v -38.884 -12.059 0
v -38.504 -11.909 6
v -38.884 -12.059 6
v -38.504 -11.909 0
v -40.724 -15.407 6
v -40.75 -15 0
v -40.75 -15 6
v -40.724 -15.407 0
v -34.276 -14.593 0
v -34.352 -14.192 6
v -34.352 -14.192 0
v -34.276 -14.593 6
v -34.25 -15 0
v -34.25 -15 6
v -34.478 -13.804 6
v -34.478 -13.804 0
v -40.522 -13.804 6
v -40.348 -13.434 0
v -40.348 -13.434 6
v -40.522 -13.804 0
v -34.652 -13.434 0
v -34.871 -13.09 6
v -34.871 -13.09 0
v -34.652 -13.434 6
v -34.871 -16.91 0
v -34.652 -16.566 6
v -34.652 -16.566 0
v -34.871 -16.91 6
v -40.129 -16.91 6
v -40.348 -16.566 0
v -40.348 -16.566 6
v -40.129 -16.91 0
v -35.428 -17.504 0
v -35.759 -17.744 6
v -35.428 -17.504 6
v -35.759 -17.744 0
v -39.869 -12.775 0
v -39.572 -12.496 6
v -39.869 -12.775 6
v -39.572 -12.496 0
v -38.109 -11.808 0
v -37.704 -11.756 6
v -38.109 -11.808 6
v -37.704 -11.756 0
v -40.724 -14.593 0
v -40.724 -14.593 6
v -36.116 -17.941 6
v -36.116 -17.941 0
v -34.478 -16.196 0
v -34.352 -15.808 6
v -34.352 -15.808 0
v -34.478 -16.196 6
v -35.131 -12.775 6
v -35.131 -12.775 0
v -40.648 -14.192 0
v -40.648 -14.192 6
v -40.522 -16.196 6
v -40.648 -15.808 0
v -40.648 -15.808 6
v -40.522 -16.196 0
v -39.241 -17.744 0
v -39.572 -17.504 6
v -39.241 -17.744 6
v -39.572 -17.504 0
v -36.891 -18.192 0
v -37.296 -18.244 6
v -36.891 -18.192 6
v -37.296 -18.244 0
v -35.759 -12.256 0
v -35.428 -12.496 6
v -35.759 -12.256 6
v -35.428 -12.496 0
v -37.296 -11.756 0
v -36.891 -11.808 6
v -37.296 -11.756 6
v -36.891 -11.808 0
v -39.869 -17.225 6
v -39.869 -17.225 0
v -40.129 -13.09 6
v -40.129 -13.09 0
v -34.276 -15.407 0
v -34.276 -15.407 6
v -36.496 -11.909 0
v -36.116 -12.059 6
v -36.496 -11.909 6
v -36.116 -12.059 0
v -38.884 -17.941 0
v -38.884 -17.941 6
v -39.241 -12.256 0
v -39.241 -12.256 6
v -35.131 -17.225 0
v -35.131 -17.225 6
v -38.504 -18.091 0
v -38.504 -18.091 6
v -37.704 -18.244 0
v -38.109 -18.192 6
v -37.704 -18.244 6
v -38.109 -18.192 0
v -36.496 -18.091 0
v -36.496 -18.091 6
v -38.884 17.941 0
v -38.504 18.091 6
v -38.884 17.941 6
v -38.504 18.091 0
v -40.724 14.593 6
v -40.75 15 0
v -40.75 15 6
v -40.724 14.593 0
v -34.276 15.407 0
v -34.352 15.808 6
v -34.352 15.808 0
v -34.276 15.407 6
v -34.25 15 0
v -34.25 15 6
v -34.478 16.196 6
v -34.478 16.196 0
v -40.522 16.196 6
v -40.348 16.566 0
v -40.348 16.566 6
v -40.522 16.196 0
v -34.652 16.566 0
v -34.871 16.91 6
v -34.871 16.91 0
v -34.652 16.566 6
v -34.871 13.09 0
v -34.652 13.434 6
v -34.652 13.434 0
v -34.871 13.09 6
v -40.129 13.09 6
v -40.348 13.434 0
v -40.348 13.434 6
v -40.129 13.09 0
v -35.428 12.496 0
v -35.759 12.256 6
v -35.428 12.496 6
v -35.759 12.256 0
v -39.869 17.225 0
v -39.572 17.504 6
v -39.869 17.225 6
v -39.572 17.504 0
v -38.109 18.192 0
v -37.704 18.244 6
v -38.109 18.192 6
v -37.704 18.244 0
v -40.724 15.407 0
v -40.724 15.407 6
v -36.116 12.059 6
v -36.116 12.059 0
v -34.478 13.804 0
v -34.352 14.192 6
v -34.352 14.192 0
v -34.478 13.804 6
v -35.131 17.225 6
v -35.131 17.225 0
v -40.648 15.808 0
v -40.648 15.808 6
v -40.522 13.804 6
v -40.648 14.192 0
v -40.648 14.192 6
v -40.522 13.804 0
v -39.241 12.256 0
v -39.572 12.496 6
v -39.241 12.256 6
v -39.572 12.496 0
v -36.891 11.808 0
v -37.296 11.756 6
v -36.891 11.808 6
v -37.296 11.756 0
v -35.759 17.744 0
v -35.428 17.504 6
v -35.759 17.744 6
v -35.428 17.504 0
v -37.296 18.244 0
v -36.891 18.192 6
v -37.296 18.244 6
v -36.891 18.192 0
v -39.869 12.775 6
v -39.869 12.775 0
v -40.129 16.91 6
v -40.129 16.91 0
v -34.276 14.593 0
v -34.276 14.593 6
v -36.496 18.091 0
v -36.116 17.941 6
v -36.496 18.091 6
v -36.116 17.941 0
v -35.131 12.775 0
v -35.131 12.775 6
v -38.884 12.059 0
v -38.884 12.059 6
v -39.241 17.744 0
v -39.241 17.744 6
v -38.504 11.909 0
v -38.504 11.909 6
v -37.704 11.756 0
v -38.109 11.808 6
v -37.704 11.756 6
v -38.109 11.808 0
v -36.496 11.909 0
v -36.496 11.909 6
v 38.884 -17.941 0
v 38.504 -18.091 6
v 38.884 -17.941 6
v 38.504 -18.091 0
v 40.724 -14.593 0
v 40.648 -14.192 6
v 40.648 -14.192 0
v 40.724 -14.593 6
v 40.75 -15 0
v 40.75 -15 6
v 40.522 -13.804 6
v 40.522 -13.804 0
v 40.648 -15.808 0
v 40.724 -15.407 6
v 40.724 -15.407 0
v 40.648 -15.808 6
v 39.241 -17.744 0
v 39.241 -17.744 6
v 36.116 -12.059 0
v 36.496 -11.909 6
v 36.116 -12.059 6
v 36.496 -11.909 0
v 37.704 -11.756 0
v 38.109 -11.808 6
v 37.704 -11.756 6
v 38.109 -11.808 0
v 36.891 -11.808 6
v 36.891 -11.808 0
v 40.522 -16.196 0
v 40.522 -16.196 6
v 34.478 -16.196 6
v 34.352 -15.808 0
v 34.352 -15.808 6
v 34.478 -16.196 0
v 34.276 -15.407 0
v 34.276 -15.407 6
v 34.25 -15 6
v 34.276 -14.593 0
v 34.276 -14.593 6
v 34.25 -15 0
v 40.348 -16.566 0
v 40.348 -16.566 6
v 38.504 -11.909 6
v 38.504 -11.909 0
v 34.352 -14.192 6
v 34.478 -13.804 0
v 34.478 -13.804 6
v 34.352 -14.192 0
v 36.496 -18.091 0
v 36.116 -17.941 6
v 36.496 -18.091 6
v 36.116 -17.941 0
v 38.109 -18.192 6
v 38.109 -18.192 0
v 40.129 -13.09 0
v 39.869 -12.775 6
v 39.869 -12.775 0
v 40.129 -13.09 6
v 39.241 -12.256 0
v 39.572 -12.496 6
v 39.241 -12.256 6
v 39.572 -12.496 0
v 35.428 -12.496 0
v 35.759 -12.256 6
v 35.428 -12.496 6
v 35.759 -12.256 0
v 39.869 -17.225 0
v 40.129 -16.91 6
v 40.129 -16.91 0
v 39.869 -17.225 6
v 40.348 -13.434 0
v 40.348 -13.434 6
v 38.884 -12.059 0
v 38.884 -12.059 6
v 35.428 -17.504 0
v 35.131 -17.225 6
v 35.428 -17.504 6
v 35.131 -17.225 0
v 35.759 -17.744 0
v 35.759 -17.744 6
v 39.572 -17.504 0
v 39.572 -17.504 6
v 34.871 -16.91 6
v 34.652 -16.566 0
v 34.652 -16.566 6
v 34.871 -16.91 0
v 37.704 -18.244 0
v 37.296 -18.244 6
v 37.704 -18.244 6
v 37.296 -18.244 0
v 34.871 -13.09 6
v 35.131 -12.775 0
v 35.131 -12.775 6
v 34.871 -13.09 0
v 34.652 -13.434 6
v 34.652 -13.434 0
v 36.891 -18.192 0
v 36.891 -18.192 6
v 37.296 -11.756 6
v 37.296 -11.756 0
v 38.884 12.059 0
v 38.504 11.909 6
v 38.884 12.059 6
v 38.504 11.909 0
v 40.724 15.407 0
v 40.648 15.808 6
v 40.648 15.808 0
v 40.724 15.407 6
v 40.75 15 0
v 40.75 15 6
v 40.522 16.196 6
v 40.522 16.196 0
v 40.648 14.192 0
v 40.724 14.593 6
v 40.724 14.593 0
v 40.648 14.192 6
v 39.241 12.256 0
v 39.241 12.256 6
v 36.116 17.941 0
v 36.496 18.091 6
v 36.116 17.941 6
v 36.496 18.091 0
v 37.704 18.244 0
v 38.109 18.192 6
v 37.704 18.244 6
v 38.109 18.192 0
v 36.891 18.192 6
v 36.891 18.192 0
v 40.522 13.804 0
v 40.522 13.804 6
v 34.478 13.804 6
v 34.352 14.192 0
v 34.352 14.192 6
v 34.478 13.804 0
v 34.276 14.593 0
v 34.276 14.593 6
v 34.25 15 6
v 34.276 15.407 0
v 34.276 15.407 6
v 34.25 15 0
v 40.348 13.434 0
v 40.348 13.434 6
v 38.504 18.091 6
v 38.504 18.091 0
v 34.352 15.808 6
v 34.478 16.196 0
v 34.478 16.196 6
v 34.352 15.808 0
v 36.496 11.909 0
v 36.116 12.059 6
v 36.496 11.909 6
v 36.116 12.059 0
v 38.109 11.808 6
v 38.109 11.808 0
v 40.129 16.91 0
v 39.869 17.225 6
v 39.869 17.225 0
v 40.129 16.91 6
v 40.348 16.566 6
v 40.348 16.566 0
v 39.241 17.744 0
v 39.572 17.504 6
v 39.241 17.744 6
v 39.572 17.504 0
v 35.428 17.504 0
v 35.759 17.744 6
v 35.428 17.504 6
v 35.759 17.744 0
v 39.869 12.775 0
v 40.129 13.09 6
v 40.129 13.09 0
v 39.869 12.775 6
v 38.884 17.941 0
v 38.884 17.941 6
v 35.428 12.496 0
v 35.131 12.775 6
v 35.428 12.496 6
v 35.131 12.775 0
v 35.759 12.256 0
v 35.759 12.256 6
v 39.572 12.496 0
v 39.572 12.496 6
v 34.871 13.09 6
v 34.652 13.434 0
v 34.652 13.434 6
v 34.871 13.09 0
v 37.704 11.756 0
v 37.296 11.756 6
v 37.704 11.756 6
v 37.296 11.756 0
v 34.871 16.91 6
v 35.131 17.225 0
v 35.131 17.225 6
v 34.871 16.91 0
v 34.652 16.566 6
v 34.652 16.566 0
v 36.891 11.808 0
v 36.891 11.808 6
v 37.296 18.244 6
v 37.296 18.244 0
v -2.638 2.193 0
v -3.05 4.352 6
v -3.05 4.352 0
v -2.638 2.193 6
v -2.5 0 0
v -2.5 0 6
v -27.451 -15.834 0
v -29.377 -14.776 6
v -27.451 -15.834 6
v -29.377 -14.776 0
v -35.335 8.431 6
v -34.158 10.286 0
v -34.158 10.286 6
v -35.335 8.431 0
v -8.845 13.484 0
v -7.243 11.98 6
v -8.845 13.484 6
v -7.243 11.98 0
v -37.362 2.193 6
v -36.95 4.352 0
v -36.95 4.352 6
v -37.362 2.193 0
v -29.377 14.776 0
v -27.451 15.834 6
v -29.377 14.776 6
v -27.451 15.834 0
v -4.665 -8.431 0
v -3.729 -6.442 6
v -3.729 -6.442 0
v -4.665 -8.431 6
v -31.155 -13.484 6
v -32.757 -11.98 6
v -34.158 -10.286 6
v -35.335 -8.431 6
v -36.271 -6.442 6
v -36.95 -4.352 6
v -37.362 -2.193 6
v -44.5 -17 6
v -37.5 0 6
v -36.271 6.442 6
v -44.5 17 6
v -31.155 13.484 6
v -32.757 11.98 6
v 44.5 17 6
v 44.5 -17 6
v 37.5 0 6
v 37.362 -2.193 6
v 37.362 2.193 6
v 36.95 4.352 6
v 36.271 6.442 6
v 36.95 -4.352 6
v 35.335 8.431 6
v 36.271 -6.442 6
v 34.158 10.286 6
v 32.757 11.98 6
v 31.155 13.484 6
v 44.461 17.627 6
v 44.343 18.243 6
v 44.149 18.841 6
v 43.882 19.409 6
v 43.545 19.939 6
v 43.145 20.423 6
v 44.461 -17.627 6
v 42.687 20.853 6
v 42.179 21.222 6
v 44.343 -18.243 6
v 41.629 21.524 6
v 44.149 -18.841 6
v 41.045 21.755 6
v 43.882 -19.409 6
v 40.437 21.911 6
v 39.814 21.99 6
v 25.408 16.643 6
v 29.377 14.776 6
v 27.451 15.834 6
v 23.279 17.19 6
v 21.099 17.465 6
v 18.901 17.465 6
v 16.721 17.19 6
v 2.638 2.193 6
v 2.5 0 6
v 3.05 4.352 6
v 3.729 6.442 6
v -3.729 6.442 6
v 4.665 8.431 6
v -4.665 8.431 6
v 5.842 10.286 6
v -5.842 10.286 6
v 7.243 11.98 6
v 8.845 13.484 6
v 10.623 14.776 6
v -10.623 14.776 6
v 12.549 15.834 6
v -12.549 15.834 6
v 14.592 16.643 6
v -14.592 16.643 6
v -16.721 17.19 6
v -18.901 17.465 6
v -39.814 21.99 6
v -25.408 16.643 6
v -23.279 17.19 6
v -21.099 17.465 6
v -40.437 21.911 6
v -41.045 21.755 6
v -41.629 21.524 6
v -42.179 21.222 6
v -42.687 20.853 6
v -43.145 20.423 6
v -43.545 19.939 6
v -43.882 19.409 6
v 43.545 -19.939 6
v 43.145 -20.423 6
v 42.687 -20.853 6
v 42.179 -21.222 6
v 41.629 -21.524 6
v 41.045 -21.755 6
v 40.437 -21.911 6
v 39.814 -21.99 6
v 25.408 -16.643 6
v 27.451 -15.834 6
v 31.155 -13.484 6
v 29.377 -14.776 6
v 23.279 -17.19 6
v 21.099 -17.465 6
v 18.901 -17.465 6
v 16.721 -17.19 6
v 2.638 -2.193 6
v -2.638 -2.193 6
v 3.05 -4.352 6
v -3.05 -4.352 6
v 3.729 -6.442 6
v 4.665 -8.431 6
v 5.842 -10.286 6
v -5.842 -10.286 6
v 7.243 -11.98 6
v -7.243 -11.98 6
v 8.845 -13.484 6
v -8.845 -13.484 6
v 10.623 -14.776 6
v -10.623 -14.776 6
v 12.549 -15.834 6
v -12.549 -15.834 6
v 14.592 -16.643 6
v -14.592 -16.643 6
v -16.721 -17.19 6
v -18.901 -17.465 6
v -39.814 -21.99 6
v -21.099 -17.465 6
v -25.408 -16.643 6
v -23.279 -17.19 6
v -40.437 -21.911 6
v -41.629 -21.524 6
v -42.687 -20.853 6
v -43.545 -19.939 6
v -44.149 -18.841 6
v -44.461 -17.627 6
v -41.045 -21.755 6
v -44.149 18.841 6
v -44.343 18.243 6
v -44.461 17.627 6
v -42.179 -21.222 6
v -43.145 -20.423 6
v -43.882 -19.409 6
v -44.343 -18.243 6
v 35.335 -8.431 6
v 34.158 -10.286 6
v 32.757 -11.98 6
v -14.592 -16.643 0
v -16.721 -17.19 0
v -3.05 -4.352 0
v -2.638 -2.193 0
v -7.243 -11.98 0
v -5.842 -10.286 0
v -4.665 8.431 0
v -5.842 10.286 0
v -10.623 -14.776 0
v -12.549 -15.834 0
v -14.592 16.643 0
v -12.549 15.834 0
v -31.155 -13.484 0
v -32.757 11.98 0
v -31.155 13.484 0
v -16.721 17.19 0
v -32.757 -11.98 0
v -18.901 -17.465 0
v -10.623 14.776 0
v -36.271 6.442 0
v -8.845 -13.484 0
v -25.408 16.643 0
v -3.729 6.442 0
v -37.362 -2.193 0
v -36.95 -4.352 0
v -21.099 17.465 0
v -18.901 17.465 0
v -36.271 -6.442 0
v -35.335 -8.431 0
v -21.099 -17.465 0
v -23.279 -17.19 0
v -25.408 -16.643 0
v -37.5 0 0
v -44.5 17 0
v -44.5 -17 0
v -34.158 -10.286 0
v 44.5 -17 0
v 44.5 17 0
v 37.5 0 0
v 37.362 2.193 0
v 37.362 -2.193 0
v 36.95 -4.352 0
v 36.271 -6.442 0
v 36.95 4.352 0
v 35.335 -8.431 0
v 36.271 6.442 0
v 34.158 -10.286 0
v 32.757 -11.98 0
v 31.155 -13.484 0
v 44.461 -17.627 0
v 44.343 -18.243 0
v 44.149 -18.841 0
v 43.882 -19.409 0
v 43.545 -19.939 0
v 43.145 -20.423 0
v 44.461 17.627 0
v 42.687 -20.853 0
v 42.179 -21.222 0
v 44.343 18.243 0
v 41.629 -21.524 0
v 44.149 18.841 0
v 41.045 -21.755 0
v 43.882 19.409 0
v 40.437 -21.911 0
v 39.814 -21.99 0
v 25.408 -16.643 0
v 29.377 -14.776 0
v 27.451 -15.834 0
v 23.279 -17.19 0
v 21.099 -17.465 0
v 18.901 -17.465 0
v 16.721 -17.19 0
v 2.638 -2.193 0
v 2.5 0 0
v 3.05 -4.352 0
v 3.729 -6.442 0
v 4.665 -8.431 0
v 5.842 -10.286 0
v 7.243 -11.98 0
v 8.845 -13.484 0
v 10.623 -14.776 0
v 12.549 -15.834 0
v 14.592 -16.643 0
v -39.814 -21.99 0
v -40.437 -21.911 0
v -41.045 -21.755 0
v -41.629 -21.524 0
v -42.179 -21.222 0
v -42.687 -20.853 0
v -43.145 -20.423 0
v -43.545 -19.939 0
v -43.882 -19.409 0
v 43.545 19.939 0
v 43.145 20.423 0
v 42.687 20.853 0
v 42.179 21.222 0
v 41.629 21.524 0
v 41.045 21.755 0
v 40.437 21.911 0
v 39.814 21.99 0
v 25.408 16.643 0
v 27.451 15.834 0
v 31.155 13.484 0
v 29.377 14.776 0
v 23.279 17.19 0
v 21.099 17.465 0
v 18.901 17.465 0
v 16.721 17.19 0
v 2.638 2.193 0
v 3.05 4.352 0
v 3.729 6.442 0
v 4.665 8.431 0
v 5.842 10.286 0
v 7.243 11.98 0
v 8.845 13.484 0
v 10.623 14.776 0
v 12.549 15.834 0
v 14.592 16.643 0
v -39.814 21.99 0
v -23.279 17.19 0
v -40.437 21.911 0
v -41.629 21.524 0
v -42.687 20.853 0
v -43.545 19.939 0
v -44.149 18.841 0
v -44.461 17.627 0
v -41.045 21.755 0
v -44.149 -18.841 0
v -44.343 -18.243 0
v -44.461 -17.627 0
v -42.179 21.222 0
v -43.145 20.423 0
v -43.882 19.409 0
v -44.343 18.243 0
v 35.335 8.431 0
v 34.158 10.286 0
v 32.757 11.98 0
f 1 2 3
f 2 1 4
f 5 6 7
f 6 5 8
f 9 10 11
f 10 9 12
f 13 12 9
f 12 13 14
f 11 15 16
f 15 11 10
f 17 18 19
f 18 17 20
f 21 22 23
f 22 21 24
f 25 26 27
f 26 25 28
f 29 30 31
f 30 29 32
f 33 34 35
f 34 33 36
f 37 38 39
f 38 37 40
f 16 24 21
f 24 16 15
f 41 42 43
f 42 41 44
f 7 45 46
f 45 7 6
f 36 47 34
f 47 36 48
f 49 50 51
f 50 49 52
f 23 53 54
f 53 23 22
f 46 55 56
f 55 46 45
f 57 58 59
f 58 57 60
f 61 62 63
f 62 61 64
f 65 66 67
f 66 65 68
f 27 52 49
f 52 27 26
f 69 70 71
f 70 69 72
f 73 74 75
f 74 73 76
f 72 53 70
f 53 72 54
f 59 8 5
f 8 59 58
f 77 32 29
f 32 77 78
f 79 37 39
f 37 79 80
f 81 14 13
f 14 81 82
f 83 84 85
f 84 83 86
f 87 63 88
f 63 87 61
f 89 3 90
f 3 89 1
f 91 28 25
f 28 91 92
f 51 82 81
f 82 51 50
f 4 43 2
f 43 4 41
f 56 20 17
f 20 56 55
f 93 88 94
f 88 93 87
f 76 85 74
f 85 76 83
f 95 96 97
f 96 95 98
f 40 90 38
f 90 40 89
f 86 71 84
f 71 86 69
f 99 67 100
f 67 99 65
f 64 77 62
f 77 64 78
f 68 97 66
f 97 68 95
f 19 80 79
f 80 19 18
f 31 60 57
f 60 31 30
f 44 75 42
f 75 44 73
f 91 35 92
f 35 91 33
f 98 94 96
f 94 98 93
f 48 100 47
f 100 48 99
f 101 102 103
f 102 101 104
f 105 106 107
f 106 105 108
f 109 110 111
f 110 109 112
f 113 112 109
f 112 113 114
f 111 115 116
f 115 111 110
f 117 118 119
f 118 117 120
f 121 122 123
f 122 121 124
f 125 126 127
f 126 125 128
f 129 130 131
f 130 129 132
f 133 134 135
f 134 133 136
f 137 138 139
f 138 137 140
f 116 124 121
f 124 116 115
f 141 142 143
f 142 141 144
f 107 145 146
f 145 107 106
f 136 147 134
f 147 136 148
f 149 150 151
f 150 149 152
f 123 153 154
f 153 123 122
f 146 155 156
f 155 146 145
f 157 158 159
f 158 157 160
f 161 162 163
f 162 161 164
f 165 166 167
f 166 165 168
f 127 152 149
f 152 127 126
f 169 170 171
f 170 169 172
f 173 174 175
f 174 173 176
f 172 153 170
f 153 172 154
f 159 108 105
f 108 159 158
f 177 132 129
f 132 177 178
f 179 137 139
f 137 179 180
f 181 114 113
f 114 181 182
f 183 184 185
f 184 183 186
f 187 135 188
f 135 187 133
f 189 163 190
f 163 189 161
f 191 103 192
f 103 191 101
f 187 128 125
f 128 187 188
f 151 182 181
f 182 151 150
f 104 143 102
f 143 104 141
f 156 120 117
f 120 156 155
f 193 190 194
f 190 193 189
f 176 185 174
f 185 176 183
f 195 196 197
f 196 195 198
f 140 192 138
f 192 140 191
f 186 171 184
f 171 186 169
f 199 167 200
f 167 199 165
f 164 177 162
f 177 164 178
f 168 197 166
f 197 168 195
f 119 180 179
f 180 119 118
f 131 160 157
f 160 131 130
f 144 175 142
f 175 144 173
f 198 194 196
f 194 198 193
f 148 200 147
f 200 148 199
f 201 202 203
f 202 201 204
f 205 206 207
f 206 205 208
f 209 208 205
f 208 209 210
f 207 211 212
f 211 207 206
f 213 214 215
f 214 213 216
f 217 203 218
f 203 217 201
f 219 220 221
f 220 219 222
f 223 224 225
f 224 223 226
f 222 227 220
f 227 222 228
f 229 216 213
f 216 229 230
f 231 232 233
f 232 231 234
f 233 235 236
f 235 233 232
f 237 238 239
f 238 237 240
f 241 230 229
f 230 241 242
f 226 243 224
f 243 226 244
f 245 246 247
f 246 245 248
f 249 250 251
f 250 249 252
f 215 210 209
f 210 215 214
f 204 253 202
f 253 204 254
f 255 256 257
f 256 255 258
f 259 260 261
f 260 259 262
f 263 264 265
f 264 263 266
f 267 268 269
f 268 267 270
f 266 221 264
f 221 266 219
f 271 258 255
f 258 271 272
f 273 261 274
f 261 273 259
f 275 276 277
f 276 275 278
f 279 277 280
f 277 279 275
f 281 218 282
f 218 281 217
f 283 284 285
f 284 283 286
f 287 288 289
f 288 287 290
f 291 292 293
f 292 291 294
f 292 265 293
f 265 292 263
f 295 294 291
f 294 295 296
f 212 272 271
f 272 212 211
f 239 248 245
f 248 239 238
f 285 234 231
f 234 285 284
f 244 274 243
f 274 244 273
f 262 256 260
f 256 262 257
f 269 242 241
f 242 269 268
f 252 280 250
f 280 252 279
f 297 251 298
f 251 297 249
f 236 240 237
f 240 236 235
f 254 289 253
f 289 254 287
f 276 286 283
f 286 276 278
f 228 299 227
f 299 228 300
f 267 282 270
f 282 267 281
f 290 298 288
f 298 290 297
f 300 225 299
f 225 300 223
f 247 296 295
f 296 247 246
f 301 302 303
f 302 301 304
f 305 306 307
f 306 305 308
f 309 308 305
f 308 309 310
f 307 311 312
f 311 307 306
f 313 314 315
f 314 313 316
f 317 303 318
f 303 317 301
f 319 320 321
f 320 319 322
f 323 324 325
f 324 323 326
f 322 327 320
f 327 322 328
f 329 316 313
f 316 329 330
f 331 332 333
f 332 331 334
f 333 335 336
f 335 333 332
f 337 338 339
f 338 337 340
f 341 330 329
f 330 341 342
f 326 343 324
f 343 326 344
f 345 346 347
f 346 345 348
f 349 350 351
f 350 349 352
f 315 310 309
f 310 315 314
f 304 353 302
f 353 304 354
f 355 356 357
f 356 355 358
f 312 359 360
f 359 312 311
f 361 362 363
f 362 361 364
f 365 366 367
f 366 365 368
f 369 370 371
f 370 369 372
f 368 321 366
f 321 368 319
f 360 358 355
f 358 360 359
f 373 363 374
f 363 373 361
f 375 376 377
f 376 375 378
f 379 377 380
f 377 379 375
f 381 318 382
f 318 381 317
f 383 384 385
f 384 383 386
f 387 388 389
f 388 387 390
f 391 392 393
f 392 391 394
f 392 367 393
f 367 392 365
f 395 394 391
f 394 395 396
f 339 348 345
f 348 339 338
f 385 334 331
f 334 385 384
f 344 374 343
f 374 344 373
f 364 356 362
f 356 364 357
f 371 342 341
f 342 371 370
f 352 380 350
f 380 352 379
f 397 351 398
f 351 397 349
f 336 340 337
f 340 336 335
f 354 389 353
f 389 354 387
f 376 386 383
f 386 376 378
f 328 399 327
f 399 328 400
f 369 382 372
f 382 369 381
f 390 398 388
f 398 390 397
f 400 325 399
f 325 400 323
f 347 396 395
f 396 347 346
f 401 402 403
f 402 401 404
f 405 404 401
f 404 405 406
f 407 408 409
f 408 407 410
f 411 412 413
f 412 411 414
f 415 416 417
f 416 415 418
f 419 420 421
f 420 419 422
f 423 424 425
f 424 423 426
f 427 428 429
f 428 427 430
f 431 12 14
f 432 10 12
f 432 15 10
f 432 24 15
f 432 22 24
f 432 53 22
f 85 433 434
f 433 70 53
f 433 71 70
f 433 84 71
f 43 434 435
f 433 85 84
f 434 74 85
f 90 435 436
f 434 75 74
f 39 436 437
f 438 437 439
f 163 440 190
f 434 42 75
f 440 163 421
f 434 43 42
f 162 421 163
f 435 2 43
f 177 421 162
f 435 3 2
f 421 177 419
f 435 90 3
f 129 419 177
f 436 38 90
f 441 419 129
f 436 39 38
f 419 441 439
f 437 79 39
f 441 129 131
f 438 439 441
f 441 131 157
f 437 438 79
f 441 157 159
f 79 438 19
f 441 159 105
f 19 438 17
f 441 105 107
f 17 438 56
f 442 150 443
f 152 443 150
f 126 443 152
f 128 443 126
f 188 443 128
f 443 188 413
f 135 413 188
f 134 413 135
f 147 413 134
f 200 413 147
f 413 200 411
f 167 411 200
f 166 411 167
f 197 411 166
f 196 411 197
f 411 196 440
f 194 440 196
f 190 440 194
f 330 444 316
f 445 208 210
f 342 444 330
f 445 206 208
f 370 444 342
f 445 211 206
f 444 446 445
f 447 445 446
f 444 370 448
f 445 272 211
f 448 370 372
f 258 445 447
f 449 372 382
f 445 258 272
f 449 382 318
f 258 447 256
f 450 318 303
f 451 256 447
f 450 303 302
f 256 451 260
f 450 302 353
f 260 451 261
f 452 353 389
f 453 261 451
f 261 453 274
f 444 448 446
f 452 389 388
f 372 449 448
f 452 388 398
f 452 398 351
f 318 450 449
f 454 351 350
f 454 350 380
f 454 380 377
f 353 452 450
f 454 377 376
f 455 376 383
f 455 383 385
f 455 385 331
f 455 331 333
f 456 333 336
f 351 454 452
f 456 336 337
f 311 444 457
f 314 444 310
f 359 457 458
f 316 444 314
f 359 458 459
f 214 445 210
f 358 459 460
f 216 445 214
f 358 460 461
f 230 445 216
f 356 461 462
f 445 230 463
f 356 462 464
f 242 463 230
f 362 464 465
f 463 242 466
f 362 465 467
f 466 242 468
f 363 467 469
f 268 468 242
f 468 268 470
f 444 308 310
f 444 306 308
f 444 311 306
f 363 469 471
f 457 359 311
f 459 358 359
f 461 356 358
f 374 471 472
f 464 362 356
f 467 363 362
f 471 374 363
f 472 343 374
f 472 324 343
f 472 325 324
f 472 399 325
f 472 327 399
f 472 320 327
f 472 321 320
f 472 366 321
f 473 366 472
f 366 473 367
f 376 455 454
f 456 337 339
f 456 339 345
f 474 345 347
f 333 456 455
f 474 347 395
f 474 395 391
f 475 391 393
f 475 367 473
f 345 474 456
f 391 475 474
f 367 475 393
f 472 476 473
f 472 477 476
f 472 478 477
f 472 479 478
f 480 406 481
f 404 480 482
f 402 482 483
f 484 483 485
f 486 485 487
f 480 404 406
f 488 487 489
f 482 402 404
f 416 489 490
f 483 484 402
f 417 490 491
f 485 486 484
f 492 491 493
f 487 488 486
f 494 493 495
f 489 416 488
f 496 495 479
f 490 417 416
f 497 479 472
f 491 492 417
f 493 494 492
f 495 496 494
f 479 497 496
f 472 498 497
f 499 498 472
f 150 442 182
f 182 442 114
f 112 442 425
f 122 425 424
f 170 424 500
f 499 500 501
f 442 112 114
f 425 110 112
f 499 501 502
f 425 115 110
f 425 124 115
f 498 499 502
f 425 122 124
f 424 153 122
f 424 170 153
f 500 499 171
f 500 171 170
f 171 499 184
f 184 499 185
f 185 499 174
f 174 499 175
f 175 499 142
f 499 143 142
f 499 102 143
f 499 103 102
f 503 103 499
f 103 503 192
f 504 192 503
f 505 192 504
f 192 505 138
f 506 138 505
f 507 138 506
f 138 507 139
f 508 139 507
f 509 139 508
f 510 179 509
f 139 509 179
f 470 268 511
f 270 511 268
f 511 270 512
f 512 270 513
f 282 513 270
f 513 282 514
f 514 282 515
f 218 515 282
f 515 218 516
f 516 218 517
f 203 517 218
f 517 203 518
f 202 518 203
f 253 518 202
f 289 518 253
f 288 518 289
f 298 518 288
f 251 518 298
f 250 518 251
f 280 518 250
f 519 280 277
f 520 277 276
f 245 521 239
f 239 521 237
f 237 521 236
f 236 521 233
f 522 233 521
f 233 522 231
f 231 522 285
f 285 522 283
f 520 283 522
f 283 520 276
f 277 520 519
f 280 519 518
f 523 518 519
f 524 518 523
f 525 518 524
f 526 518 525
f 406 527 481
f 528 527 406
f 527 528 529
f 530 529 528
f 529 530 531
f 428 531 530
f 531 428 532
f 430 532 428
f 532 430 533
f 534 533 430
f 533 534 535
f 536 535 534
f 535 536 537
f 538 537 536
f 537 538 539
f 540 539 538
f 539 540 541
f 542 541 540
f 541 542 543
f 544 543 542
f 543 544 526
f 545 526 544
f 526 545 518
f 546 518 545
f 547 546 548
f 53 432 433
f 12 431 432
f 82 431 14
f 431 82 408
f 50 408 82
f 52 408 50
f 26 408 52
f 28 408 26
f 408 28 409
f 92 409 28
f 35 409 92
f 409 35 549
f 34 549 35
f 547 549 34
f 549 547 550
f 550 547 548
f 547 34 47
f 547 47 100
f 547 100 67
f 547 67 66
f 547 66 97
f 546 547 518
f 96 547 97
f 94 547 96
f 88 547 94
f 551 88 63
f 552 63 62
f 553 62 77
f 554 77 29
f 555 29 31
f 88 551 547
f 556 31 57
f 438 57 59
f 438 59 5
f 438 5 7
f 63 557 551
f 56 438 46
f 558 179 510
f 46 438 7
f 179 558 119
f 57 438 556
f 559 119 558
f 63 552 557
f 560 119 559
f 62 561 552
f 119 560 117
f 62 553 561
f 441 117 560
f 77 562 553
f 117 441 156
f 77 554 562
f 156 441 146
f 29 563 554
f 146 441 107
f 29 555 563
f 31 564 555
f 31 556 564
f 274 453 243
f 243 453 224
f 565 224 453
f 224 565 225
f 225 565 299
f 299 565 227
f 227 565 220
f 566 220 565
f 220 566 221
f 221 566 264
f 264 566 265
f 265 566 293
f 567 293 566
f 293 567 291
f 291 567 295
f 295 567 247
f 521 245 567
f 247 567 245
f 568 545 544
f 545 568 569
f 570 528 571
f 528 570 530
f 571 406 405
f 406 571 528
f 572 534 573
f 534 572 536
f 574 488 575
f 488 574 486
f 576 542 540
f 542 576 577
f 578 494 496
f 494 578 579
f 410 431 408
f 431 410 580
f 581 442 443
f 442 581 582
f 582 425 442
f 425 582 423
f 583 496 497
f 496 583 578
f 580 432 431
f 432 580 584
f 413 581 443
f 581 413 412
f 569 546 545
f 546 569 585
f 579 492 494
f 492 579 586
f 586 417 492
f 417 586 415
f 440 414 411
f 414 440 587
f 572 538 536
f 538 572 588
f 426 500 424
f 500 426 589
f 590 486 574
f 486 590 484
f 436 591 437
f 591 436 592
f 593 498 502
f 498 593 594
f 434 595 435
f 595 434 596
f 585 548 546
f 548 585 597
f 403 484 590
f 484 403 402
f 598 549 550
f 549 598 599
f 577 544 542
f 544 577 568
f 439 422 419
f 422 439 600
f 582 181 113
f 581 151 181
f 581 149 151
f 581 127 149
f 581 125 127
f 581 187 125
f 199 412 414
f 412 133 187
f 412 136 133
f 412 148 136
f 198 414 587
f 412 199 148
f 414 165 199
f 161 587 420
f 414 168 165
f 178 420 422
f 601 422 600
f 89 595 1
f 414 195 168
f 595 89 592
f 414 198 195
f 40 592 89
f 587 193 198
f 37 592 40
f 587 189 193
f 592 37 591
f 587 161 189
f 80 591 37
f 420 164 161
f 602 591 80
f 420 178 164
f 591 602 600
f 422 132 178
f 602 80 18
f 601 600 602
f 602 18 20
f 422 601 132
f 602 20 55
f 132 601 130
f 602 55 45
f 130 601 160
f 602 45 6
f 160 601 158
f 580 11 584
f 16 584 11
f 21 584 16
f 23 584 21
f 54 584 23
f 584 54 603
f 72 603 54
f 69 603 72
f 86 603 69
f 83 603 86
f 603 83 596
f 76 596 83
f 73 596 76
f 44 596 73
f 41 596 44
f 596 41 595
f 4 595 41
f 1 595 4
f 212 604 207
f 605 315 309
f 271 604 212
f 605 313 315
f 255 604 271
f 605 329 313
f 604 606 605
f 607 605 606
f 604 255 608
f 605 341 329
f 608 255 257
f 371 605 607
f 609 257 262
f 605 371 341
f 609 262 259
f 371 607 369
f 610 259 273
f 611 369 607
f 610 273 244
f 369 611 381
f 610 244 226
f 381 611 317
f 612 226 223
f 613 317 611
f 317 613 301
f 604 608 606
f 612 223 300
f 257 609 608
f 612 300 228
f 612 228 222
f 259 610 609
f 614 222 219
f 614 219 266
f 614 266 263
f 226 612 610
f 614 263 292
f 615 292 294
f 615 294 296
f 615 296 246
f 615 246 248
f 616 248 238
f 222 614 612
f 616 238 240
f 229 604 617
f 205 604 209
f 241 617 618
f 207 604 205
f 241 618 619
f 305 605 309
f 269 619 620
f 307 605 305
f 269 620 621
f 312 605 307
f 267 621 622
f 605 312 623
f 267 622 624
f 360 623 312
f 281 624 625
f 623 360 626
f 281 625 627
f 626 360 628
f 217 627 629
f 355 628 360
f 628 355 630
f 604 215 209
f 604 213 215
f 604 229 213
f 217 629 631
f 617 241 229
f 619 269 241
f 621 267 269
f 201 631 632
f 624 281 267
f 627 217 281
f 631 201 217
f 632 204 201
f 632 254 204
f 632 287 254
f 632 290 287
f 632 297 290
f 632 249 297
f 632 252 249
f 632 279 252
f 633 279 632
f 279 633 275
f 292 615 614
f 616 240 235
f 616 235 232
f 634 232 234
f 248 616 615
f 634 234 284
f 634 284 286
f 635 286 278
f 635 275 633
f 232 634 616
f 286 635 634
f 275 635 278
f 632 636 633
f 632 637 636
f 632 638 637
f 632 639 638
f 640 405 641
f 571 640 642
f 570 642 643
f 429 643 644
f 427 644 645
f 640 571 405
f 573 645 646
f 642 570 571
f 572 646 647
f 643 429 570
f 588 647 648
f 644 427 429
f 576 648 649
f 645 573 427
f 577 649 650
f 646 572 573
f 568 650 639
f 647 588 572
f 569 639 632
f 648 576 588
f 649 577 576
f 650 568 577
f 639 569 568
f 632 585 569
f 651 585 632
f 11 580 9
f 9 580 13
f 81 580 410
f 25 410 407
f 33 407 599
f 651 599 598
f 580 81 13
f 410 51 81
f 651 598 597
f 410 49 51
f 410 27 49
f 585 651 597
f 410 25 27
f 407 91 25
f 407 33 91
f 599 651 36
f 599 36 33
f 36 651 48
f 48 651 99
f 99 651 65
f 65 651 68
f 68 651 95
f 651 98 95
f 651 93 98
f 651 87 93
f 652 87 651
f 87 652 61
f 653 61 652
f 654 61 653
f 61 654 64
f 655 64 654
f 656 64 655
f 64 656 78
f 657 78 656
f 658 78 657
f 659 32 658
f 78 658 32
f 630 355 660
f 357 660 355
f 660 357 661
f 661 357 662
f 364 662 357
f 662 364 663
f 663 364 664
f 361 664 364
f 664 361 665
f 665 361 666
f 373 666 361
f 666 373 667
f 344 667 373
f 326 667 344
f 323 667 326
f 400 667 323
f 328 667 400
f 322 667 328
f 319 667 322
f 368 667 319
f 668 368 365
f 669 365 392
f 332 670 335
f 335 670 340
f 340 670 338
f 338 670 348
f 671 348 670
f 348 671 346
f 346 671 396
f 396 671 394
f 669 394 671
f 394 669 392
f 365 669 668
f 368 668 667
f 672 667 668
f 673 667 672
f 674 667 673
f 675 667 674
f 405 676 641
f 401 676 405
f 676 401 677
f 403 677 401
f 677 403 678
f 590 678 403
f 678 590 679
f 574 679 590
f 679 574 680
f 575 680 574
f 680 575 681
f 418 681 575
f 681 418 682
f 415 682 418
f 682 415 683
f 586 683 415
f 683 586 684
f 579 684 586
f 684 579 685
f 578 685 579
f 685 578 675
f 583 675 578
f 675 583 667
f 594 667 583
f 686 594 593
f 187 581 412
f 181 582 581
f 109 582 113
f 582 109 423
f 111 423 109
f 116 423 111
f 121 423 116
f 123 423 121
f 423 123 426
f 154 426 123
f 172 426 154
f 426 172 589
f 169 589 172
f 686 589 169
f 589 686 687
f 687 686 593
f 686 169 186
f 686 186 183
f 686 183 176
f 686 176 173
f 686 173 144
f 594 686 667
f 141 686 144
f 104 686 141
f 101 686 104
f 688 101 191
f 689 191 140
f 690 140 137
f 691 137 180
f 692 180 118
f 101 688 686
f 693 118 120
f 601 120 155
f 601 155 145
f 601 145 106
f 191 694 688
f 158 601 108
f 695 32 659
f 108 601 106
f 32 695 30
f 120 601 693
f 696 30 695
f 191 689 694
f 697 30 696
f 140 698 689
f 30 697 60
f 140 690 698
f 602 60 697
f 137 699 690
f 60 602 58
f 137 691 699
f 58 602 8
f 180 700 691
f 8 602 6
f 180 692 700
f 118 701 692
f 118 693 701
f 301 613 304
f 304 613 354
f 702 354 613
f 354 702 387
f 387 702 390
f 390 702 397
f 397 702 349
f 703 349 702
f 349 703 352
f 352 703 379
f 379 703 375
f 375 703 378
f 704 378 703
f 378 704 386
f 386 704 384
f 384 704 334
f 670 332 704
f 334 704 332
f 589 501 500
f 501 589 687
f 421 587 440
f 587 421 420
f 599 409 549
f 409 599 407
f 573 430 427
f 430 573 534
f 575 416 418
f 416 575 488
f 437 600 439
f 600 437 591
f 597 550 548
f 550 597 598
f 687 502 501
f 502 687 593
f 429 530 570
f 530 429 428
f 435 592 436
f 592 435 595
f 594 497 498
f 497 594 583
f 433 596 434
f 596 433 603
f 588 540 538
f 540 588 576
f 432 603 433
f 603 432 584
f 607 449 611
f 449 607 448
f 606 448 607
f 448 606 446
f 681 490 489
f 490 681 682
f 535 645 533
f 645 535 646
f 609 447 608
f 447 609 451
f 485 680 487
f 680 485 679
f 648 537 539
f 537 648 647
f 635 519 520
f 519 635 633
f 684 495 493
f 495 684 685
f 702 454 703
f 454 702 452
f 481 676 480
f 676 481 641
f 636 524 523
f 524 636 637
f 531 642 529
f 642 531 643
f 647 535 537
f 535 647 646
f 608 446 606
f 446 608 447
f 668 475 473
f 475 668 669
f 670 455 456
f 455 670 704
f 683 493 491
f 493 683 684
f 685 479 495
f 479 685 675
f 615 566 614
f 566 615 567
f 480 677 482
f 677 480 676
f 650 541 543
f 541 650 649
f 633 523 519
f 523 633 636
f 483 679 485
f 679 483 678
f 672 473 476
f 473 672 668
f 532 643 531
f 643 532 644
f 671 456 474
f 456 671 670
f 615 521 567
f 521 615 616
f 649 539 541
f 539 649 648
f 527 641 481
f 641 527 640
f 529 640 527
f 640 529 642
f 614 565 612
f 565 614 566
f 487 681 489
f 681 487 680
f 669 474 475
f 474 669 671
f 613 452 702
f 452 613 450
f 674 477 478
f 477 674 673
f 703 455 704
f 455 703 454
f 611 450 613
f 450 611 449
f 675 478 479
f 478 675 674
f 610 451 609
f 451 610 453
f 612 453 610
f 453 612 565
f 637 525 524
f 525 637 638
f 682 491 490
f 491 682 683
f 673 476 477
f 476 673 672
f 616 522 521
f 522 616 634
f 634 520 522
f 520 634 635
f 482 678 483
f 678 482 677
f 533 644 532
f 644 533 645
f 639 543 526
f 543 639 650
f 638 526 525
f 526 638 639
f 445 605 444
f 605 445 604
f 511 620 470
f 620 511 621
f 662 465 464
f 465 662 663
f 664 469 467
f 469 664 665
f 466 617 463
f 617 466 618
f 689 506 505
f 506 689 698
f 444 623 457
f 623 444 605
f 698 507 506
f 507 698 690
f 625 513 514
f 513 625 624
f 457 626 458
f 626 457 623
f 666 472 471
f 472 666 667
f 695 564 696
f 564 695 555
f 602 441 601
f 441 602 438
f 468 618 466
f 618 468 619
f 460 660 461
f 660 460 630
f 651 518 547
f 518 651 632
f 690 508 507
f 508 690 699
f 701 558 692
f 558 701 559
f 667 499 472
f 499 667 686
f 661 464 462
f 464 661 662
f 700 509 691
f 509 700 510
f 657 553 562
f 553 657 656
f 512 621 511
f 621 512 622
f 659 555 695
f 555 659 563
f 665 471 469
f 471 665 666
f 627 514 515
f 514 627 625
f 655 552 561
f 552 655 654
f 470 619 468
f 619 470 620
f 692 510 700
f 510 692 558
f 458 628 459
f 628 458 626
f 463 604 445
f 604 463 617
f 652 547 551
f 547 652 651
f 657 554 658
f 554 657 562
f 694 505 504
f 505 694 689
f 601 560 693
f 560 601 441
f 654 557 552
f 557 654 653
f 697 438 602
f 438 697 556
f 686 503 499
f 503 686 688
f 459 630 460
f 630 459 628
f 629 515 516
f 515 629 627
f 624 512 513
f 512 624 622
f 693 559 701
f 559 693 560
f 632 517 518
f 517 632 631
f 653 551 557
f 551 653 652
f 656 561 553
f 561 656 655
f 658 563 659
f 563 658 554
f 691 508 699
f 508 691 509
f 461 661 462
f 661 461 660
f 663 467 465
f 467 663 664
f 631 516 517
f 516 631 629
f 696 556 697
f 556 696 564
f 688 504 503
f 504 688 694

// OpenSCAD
$fn = 50;


difference() {
	union() {
		hull() {
			translate(v = [-39.5000000000, 17.0000000000, 0]) {
				cylinder(h = 6, r = 5);
			}
			translate(v = [39.5000000000, 17.0000000000, 0]) {
				cylinder(h = 6, r = 5);
			}
			translate(v = [-39.5000000000, -17.0000000000, 0]) {
				cylinder(h = 6, r = 5);
			}
			translate(v = [39.5000000000, -17.0000000000, 0]) {
				cylinder(h = 6, r = 5);
			}
		}
	}
	union() {
		#translate(v = [-37.5000000000, -15.0000000000, -100.0000000000]) {
			cylinder(h = 200, r = 3.2500000000);
		}
		#translate(v = [-37.5000000000, 15.0000000000, -100.0000000000]) {
			cylinder(h = 200, r = 3.2500000000);
		}
		#translate(v = [37.5000000000, -15.0000000000, -100.0000000000]) {
			cylinder(h = 200, r = 3.2500000000);
		}
		#translate(v = [37.5000000000, 15.0000000000, -100.0000000000]) {
			cylinder(h = 200, r = 3.2500000000);
		}
		#translate(v = [-20.0000000000, 0, 0]) {
			cylinder(h = 6, r = 17.5000000000);
		}
		#translate(v = [20.0000000000, 0, 0]) {
			cylinder(h = 6, r = 17.5000000000);
		}
	}
}
